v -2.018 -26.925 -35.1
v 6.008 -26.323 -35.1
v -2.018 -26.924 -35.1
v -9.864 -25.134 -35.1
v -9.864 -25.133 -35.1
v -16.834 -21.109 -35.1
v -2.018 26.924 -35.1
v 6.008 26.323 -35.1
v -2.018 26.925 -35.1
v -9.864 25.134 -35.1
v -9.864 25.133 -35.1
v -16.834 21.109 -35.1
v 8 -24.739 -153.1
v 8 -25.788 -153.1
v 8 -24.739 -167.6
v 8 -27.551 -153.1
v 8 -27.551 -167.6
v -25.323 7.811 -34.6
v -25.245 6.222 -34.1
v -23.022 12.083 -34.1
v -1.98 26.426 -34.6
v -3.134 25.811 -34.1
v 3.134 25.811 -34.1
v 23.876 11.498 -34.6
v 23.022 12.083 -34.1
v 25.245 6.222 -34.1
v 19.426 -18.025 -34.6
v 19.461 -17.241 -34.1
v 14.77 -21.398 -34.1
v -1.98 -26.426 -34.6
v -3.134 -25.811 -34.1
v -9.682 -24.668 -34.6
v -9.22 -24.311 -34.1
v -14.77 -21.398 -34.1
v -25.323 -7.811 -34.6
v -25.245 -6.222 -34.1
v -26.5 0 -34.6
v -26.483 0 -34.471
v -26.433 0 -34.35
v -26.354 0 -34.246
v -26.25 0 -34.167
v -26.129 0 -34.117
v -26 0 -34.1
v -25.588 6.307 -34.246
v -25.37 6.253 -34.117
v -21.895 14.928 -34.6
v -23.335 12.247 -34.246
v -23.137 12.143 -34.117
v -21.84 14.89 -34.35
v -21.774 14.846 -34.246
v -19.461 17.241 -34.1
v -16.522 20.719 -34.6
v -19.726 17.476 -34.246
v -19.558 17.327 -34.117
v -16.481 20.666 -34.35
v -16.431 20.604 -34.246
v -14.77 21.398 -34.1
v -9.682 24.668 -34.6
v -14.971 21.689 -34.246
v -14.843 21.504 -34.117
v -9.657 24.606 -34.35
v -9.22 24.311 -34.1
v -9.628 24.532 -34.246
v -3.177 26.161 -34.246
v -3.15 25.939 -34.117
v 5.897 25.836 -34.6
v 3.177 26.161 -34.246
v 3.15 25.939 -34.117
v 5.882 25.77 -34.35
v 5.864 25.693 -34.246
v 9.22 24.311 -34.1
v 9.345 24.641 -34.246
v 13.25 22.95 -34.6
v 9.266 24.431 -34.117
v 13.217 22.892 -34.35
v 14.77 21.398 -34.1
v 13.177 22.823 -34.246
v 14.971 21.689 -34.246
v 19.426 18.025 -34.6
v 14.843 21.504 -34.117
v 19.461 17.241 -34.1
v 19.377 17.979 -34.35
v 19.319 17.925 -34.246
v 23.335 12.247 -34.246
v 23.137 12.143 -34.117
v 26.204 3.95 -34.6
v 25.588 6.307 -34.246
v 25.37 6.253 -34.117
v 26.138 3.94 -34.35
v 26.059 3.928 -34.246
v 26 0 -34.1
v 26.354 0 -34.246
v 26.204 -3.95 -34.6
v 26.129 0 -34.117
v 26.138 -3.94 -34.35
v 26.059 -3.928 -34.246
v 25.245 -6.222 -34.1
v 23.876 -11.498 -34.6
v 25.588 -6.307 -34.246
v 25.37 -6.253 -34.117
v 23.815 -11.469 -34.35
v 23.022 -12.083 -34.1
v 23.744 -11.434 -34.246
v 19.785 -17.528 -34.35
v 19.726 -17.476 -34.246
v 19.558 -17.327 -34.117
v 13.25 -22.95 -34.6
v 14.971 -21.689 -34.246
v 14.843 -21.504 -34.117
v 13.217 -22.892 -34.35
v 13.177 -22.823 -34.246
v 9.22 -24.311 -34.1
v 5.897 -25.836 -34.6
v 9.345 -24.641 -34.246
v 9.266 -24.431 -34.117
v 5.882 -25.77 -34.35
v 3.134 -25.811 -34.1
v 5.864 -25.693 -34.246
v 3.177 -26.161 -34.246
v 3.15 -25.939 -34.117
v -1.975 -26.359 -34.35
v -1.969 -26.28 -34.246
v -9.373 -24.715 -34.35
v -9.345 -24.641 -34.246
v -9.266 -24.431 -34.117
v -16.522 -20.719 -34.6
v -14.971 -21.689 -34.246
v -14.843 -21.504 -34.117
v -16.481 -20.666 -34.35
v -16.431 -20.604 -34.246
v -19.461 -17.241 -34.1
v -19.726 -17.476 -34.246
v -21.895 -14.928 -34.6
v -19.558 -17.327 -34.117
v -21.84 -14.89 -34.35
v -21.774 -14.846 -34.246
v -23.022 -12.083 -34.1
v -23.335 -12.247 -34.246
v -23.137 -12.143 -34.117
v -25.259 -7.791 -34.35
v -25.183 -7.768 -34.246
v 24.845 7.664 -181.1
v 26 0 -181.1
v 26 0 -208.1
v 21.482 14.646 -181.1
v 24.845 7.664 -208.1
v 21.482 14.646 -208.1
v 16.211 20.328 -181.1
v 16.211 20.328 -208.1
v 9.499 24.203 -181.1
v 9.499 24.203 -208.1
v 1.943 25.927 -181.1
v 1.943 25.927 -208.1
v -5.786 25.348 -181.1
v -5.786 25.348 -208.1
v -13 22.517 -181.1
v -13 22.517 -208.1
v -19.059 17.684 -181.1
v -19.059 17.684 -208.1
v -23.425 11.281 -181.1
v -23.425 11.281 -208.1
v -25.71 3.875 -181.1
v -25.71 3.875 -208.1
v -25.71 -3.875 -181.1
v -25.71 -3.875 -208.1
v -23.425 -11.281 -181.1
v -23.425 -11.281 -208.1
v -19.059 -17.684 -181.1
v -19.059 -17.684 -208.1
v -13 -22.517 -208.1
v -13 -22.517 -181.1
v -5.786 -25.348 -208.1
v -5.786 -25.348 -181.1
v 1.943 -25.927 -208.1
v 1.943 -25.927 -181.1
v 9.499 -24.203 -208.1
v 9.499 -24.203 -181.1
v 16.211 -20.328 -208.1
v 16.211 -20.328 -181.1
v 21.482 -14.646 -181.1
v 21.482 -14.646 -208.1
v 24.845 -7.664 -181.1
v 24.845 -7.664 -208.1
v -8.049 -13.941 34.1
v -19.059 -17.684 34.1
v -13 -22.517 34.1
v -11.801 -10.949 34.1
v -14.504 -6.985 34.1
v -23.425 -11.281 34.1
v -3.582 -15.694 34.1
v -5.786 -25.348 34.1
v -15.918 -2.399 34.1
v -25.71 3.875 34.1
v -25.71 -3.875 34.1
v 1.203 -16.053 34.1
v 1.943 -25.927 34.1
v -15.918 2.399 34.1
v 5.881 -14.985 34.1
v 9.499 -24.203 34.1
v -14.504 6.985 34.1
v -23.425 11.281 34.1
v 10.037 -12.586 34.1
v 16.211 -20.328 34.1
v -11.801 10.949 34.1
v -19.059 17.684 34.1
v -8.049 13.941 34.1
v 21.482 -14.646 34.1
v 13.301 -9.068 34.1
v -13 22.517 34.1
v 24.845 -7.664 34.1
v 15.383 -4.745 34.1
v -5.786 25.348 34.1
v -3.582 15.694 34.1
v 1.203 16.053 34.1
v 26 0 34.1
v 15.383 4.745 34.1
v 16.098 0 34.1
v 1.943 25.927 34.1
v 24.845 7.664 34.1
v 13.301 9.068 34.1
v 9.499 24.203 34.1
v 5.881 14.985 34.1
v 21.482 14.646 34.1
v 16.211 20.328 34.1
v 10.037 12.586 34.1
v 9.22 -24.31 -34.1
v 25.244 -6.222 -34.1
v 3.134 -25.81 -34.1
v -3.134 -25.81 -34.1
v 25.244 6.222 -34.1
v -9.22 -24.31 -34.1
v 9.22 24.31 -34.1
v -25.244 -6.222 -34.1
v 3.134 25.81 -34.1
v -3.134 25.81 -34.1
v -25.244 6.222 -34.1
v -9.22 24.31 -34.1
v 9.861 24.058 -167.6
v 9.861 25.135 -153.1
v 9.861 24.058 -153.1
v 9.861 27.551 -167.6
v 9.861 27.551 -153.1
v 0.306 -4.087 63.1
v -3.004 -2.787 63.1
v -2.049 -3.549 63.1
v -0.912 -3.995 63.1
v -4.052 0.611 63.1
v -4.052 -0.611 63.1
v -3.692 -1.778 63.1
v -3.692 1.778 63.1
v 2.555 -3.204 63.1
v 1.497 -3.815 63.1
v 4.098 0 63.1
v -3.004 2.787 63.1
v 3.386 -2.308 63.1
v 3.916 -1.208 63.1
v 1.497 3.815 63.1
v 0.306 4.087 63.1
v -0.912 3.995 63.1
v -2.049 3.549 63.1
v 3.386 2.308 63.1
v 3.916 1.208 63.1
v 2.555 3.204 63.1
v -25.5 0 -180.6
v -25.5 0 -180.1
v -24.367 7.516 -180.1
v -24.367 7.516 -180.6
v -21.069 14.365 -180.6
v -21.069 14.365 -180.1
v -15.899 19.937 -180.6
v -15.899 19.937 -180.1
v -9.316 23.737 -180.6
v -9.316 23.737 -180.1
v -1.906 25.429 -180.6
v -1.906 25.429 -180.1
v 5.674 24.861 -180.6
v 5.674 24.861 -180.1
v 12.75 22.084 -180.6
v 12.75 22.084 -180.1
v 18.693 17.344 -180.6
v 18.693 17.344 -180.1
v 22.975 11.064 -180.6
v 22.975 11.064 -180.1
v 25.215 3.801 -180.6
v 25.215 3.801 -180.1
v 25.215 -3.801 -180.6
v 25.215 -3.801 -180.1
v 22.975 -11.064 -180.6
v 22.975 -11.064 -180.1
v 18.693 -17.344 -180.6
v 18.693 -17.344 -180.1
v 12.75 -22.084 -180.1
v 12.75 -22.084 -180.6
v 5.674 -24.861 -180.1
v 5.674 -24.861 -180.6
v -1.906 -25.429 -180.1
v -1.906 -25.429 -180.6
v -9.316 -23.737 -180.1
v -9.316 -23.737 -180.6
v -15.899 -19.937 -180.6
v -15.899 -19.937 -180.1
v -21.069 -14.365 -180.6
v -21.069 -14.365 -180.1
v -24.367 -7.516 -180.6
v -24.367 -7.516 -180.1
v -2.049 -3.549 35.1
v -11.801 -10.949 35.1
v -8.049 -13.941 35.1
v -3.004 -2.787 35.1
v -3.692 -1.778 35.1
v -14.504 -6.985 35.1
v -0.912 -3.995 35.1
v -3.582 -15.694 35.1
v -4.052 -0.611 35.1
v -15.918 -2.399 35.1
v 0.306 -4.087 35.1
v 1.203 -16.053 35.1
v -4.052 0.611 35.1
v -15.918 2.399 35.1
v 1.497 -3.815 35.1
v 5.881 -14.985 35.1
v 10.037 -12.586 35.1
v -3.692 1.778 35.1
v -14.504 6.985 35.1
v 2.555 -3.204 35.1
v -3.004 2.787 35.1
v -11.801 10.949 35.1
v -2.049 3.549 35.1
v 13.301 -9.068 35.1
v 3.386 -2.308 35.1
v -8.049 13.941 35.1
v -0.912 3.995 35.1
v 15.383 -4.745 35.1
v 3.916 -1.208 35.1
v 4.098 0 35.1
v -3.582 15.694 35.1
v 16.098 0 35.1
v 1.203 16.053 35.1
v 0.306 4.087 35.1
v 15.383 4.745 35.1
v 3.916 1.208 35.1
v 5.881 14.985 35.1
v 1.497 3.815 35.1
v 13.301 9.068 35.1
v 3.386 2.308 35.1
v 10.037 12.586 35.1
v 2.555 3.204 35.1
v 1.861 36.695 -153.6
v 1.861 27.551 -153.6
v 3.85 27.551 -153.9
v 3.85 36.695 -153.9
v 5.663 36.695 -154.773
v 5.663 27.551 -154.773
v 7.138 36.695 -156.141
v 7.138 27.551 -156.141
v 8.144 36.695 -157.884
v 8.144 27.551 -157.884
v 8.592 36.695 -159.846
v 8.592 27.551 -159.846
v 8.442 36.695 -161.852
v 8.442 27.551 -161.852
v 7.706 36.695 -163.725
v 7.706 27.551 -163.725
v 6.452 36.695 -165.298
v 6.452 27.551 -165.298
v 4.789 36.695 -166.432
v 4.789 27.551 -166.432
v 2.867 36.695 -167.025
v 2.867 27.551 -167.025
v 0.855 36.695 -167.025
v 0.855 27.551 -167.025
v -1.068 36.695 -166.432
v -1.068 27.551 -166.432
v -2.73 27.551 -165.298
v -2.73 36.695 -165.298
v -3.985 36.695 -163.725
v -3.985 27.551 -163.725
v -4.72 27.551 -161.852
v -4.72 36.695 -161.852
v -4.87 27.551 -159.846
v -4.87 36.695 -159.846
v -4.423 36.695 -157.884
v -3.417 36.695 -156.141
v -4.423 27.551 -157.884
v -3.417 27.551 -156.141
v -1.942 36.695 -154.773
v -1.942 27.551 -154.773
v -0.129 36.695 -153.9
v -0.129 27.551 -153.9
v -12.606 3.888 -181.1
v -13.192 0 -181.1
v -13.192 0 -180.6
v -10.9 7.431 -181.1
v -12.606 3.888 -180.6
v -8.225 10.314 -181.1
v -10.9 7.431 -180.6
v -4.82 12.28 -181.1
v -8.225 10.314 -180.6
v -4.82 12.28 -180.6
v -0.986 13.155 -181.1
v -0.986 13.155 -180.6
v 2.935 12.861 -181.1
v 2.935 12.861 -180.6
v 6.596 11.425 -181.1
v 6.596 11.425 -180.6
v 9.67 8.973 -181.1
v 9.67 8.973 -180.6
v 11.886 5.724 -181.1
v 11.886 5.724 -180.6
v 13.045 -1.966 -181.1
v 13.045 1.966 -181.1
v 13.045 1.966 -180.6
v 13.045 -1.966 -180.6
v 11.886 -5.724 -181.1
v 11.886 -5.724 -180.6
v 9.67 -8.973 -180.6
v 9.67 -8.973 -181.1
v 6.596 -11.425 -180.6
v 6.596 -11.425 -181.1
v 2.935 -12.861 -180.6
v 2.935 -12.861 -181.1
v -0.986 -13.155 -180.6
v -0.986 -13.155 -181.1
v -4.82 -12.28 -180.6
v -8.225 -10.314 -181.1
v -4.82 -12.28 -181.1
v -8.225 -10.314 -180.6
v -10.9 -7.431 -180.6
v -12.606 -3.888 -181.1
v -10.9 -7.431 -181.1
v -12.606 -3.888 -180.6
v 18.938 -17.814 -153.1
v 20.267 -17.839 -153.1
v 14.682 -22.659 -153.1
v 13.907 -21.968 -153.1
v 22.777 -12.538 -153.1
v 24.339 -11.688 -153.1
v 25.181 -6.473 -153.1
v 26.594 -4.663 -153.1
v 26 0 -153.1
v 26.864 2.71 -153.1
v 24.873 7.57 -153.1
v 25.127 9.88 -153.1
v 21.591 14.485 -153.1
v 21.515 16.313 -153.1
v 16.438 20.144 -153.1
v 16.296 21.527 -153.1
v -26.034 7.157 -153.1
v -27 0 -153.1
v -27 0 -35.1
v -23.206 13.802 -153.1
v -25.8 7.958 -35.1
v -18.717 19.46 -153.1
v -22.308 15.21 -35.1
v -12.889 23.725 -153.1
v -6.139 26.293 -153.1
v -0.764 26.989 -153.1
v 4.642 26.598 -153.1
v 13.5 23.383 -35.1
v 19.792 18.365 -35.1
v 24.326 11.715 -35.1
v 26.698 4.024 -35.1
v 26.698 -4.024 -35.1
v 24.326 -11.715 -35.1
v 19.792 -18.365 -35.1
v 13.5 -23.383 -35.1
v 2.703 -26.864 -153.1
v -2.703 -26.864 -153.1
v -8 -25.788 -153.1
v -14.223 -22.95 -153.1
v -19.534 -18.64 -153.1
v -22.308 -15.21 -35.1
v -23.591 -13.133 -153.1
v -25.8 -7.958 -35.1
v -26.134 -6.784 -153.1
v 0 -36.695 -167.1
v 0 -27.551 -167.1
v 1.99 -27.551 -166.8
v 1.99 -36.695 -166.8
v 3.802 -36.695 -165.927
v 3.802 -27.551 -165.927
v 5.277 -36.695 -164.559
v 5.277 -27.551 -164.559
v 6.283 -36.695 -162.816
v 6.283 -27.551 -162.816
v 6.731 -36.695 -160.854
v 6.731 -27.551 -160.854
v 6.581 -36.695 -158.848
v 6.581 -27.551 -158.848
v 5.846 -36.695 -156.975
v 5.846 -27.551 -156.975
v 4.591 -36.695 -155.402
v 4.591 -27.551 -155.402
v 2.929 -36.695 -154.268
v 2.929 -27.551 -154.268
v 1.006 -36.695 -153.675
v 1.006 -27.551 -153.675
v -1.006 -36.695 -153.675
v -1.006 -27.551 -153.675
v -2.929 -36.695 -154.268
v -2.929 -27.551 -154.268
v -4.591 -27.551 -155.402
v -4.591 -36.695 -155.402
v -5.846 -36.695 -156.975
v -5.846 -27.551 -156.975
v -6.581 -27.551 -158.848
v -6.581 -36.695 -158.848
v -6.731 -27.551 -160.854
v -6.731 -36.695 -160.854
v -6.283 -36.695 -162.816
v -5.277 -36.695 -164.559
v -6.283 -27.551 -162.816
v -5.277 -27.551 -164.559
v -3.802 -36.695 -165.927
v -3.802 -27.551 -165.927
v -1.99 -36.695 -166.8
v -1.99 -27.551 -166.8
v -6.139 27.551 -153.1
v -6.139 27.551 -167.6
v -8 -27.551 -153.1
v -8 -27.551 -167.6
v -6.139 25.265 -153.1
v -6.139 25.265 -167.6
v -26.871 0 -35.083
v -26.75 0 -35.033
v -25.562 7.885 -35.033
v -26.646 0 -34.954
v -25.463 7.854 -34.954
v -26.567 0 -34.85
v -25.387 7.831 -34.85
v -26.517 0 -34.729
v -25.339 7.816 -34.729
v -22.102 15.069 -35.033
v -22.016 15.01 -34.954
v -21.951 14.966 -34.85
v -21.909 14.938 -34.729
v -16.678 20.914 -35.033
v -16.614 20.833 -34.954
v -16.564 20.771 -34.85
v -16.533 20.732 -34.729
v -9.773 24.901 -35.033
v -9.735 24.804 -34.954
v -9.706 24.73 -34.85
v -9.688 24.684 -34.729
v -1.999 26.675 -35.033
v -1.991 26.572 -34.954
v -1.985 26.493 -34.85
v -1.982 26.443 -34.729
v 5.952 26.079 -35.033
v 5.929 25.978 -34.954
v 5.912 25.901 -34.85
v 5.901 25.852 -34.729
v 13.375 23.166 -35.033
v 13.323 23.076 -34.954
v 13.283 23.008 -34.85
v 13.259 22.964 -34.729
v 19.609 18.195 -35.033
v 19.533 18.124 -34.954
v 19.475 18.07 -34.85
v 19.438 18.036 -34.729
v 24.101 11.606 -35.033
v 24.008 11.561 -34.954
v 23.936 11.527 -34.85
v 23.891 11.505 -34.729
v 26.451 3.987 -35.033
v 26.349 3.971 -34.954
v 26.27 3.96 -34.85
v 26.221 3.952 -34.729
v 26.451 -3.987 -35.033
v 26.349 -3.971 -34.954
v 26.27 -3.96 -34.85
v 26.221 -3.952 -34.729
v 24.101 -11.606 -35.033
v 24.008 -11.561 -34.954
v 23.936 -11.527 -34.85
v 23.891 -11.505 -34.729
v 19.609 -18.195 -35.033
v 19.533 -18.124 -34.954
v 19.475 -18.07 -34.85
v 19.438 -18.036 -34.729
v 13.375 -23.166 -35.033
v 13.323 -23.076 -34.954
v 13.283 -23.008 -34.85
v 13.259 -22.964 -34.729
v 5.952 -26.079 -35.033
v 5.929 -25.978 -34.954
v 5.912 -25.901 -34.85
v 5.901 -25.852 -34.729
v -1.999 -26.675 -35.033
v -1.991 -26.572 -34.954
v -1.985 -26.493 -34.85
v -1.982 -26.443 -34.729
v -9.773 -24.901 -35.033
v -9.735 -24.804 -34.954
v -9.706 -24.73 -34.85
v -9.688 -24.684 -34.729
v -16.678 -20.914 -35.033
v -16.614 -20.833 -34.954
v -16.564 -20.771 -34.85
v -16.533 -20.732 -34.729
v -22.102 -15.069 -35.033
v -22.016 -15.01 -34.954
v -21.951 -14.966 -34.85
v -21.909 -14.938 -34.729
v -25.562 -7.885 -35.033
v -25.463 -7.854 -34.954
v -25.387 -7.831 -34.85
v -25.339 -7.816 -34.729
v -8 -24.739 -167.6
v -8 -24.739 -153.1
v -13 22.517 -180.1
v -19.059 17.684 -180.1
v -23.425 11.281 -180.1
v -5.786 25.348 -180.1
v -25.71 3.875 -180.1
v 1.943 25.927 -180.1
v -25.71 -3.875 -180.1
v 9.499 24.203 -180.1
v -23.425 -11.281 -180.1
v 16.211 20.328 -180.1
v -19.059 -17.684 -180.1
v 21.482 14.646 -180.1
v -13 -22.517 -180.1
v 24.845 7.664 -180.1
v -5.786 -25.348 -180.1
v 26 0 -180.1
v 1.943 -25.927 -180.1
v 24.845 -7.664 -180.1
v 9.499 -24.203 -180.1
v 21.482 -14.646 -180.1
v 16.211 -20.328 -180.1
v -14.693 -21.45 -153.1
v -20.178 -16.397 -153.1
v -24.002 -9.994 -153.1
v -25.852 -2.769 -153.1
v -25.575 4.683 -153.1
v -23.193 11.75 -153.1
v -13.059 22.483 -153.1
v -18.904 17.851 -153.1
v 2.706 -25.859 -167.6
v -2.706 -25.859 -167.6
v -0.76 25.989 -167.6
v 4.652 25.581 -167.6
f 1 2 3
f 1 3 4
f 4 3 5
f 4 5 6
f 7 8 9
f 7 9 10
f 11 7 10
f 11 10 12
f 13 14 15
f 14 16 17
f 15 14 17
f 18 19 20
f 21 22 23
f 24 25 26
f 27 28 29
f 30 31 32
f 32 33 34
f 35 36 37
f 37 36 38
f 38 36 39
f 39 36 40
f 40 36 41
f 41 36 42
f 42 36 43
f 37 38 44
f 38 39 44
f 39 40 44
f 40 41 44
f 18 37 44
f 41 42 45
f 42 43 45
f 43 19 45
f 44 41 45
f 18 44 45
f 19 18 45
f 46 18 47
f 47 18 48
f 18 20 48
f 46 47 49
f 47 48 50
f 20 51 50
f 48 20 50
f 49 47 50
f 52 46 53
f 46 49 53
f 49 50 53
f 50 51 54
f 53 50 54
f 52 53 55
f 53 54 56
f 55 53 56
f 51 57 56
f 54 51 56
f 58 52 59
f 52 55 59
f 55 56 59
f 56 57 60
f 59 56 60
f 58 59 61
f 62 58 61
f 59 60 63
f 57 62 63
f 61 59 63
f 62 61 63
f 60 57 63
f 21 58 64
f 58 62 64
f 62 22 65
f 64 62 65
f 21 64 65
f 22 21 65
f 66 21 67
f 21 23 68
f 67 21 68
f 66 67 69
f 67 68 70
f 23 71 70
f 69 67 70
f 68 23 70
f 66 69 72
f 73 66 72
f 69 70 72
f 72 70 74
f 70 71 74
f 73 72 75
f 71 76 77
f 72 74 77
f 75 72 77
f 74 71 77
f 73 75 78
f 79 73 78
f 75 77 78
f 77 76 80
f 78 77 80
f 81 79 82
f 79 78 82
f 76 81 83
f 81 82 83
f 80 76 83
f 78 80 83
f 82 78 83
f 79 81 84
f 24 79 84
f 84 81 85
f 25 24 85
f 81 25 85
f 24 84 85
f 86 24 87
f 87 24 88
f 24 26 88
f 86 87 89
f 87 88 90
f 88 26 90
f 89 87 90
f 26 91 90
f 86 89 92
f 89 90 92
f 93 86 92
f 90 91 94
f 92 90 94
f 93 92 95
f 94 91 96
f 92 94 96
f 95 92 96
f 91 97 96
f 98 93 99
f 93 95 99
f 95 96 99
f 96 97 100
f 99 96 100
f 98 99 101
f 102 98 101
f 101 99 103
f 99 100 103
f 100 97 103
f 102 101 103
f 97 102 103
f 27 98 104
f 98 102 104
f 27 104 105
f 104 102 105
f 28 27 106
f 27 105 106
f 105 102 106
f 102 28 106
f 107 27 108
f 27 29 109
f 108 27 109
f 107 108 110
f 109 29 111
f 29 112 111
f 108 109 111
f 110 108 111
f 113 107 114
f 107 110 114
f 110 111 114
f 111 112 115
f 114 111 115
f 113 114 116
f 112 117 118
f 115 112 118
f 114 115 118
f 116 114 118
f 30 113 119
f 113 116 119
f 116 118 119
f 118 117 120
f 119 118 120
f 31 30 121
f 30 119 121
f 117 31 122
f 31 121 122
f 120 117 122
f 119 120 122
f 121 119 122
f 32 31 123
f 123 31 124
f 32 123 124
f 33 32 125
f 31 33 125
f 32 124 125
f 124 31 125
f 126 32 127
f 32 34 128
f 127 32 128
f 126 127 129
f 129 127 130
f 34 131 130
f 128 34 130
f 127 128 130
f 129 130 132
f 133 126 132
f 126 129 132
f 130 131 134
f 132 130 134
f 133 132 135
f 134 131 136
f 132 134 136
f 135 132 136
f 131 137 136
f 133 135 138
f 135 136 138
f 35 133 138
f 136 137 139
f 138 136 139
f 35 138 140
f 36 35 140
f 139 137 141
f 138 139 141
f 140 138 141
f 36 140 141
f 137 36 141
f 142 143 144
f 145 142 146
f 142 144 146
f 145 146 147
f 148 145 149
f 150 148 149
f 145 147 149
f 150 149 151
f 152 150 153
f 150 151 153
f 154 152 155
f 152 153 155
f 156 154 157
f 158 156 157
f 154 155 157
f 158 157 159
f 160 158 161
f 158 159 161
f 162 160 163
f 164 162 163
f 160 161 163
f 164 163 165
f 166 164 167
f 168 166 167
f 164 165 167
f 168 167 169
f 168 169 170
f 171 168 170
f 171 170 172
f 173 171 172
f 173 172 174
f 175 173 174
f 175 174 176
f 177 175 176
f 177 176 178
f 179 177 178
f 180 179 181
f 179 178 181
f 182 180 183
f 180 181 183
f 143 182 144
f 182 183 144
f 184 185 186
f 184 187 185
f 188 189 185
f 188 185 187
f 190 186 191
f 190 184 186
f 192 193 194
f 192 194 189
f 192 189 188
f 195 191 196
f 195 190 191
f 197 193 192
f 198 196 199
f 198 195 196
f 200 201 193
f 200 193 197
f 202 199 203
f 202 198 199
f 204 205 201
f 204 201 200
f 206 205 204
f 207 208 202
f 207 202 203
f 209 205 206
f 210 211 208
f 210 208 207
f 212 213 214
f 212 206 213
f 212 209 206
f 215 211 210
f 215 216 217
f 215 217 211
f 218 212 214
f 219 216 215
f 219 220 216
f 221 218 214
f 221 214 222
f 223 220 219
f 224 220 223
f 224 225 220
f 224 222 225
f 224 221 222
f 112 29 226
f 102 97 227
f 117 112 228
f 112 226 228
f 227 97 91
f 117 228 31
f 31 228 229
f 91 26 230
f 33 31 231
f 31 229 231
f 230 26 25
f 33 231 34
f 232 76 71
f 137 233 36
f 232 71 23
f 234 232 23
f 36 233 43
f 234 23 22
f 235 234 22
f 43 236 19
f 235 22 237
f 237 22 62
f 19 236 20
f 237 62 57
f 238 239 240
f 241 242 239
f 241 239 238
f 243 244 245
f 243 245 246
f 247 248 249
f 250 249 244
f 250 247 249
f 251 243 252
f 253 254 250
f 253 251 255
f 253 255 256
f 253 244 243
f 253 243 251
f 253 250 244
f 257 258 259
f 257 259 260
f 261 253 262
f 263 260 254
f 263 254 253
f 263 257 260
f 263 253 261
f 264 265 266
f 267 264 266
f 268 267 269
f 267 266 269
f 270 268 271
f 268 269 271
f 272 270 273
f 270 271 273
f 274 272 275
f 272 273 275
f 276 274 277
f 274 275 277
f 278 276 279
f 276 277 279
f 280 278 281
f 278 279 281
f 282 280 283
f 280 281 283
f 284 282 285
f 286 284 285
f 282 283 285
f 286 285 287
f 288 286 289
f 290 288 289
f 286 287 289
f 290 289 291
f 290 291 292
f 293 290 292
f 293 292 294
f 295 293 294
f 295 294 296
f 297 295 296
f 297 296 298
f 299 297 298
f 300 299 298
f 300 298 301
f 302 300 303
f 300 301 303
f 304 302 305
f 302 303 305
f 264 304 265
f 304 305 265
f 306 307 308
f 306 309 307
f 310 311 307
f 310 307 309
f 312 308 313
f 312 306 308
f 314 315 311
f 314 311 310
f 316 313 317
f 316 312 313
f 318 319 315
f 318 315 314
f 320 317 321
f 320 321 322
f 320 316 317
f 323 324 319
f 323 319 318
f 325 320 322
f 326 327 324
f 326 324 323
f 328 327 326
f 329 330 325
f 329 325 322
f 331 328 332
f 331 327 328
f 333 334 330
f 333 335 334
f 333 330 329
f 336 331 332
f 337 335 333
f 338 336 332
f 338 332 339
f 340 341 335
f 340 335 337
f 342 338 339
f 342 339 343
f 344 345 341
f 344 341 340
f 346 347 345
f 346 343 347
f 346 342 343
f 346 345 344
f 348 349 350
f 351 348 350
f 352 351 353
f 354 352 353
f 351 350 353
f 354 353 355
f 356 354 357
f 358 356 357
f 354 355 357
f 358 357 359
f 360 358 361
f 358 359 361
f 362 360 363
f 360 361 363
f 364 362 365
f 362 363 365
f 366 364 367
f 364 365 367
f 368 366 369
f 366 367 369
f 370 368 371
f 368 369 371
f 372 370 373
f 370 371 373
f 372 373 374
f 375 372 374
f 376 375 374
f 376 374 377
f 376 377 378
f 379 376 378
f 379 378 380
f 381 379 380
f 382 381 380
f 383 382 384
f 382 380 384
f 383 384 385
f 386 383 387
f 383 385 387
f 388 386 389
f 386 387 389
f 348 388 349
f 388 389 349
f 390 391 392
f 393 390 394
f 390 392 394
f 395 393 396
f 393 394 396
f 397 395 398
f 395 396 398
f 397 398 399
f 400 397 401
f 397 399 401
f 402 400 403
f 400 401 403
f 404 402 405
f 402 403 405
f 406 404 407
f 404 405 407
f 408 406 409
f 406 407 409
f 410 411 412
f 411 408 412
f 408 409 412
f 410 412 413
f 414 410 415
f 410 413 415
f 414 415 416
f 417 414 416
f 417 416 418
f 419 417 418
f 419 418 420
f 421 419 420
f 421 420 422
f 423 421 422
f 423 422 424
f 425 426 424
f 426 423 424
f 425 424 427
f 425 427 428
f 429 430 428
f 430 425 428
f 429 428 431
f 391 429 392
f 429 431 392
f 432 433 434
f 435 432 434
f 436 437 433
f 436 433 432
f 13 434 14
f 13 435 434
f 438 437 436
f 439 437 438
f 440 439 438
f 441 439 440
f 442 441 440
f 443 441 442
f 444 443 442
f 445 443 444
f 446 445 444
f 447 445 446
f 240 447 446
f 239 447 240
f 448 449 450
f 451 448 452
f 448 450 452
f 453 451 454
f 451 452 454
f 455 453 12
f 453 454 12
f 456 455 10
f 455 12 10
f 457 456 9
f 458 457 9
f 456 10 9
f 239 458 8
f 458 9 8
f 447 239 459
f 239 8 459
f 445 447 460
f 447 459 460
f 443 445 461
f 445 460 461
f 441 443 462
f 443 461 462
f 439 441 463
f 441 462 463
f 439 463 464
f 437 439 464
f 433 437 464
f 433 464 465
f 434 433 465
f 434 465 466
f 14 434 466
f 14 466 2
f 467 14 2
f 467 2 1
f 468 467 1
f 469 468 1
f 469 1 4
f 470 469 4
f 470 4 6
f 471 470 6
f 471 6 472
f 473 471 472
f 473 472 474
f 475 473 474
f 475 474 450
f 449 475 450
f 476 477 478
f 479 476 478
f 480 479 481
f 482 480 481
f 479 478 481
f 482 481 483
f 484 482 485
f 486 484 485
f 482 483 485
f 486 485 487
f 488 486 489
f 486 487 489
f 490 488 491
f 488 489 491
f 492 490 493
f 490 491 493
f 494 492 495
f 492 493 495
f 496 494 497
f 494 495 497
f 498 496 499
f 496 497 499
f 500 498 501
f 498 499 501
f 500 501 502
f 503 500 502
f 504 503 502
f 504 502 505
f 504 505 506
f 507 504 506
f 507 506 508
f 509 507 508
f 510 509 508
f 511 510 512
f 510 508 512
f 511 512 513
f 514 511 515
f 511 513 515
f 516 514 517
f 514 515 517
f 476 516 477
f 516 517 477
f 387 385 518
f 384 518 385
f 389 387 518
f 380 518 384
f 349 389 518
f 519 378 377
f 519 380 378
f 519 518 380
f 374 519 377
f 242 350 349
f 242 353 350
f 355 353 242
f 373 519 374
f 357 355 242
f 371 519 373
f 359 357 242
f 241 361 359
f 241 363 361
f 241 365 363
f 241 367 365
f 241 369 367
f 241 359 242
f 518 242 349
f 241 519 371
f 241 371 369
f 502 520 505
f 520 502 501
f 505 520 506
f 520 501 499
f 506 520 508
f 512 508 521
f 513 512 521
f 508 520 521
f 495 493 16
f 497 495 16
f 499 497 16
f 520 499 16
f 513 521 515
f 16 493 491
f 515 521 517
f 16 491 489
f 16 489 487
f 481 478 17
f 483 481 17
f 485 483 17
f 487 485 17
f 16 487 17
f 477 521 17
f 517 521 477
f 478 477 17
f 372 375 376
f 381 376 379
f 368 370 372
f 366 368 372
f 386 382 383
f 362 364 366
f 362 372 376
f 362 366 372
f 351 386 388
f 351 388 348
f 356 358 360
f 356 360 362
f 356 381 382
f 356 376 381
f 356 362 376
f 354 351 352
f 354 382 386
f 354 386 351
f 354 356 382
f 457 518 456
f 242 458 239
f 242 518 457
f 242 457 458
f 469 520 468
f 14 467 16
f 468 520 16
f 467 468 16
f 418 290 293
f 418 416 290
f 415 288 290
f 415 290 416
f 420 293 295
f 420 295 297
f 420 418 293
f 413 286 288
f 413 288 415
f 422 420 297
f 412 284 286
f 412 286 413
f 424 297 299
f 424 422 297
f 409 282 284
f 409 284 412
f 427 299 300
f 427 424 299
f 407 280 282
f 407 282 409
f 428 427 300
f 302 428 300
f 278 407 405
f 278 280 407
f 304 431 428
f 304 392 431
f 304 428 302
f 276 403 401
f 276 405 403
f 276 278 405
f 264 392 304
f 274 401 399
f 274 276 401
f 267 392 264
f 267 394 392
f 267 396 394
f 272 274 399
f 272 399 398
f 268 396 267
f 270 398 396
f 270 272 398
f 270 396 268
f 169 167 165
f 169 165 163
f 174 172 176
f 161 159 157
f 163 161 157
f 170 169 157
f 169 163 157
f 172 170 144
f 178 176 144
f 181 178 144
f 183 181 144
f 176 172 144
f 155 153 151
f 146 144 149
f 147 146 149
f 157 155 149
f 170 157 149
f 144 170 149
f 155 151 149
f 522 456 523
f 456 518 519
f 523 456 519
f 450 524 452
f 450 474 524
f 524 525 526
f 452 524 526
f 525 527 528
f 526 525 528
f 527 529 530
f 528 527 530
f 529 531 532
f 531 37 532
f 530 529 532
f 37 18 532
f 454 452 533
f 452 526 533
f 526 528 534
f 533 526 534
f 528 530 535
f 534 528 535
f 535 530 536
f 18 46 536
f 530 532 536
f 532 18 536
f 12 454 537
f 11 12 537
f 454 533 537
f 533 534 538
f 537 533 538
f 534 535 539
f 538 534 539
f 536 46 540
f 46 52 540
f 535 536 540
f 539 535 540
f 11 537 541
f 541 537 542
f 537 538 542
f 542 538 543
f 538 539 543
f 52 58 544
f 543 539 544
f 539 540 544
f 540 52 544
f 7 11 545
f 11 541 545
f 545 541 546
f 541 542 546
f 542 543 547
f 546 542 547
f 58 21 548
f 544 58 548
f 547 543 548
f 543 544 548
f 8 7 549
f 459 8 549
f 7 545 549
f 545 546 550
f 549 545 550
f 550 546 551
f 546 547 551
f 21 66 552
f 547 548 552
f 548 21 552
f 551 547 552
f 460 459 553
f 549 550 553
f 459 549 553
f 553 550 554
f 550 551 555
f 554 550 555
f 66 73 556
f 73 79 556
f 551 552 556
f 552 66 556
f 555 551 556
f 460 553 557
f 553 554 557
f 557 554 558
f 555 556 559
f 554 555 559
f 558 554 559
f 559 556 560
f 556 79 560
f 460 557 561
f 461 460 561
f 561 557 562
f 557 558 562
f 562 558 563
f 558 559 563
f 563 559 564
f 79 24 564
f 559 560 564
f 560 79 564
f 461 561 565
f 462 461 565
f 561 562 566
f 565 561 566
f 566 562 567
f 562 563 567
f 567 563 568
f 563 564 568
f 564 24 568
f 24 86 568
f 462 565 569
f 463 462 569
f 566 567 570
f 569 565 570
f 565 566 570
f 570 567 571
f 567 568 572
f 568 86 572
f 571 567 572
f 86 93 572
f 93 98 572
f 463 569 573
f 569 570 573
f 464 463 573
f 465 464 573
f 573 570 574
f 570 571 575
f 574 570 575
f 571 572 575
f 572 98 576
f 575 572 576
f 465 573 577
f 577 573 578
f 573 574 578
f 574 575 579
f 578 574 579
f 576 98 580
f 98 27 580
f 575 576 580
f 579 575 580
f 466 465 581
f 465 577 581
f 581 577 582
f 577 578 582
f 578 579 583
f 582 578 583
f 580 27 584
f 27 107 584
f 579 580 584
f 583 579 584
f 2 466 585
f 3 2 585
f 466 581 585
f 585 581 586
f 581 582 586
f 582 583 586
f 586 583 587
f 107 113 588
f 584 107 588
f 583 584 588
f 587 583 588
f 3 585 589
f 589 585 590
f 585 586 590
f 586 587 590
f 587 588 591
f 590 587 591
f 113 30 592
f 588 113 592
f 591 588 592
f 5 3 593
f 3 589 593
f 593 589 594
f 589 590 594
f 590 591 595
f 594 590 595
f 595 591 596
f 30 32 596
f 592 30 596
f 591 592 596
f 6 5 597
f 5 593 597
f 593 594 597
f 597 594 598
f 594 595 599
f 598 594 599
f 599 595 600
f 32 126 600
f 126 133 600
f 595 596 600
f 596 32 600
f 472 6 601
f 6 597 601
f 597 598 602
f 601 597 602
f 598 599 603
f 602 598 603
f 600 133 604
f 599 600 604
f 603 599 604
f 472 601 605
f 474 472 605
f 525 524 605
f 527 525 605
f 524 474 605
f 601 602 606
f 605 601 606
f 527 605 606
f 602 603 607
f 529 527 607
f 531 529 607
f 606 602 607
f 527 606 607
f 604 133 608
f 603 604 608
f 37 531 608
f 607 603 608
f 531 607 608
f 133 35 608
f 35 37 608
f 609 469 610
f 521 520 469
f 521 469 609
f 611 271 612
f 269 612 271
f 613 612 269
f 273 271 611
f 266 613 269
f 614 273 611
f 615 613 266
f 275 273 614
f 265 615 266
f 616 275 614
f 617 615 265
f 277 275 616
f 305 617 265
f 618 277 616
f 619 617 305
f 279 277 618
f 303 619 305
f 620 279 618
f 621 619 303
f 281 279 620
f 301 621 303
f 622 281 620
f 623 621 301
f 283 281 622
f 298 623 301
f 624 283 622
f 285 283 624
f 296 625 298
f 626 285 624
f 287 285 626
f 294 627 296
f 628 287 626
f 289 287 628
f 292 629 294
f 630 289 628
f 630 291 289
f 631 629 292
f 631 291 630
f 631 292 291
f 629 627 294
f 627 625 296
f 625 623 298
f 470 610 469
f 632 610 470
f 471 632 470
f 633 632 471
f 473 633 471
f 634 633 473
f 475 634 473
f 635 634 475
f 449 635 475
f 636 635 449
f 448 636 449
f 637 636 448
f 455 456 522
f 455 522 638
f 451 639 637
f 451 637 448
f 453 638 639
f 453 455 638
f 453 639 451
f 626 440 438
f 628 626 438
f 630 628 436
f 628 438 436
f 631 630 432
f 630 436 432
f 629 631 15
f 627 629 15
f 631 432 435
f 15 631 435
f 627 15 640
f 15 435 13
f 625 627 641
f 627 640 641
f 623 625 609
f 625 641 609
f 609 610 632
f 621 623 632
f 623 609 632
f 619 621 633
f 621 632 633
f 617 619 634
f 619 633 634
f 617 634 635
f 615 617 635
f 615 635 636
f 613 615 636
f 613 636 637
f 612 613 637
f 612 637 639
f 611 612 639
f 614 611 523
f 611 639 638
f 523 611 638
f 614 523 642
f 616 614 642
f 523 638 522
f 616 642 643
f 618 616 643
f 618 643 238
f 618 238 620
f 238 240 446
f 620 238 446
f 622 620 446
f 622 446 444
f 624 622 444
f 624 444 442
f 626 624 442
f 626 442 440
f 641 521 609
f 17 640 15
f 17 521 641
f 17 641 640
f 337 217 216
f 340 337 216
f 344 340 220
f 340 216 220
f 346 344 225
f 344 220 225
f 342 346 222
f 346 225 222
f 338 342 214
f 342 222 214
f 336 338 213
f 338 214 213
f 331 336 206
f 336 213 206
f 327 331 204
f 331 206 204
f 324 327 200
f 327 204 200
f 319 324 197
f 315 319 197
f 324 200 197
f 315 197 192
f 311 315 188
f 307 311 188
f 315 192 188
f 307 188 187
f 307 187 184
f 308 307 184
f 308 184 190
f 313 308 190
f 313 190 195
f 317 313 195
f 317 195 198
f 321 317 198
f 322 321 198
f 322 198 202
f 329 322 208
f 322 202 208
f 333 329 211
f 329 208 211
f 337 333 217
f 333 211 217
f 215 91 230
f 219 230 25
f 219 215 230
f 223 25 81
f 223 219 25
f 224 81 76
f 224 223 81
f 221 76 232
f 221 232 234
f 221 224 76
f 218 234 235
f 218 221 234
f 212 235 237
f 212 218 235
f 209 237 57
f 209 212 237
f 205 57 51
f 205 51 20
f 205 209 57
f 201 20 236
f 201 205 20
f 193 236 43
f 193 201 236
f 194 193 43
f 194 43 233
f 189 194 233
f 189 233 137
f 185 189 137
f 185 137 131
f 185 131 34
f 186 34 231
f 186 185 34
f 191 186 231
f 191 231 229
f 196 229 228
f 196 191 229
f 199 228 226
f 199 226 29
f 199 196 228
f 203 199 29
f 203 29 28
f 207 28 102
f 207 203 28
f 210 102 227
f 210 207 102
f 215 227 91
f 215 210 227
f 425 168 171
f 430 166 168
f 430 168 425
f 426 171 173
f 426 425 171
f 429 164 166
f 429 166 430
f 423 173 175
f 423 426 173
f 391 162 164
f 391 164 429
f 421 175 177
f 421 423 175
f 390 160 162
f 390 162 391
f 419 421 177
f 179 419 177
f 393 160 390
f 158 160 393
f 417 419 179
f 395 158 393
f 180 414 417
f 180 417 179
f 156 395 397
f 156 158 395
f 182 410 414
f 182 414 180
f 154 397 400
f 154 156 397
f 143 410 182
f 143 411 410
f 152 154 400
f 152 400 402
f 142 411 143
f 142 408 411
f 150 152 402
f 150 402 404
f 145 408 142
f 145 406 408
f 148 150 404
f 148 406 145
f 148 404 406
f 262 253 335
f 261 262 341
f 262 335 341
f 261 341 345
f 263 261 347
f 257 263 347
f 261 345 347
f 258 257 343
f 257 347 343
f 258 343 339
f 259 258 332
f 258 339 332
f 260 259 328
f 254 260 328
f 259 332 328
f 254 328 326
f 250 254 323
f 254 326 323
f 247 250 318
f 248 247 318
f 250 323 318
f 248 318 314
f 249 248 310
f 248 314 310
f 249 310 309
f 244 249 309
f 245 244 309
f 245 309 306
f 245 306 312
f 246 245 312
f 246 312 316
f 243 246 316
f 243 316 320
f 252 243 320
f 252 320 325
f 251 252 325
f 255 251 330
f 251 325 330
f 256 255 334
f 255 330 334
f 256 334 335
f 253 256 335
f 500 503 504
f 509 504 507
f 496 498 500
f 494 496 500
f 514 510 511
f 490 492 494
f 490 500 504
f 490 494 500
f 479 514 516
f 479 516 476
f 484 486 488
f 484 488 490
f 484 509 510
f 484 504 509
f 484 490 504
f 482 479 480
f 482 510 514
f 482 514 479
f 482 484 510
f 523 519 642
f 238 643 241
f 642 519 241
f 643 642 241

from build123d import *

# Parameters (mm, degrees)
SKETCH1_R                 = 26
BOSS_EXTRUDE3_DEPTH       = 34.1
SKETCH4_R                 = 16.098
BOSS_EXTRUDE4_DEPTH       = 1
SKETCH5_R                 = 4.098
BOSS_EXTRUDE5_DEPTH       = 28
SKETCH7_R                 = 26.5
BOSS_EXTRUDE6_DEPTH       = 1
SKETCH8_R                 = 27
BOSS_EXTRUDE8_DEPTH       = 118
SKETCH12_R                = 26
BOSS_EXTRUDE9_DEPTH       = 27
SKETCH13_R                = 25.5
BOSS_EXTRUDE10_DEPTH      = 0.5
SKETCH16_R                = 13.192
BOSS_EXTRUDE12_DEPTH      = 2
SKETCH19_R                = 2.408
BOSS_EXTRUDE13_DEPTH      = 1
BOSS_EXTRUDE14_REACH      = 195.426
BOSS_EXTRUDE14_END_RADIUS = 26
SKETCH20_W                = 16
SKETCH20_H                = 14.5
FILLET2_R                 = 0.5
MIRROR2_START             = -208.1
MIRROR2_OUTLINE_R         = 26
MIRROR2_DEPTH             = 27
BOSS_EXTRUDE17_REACH      = 218.958
BOSS_EXTRUDE17_END_RADIUS = 26
SKETCH24_W                = 16
SKETCH24_H                = 14.5
SKETCH25_R                = 6.75
BOSS_EXTRUDE18_DEPTH      = 9.144
SKETCH26_R                = 6.75
BOSS_EXTRUDE19_DEPTH      = 9.144


# Read off the part's stored shape, not the designer's step: Mirror2
with BuildPart() as part:
    # Sketch1 → Boss-Extrude3 (new, symmetric)
    with BuildSketch(Plane.XY):
        Circle(SKETCH1_R)
    extrude(amount=BOSS_EXTRUDE3_DEPTH, both=True)

    # Sketch4 → Boss-Extrude4 (add)
    with BuildSketch(Plane.XY.offset(34.1)):
        Circle(SKETCH4_R)
    extrude(amount=BOSS_EXTRUDE4_DEPTH)

    # Sketch5 → Boss-Extrude5 (add)
    with BuildSketch(Plane.XY.offset(35.1)):
        Circle(SKETCH5_R)
    extrude(amount=BOSS_EXTRUDE5_DEPTH)

    # Sketch7 → Boss-Extrude6 (add)
    with BuildSketch(Plane(origin=(0, 0, -34.1), x_dir=(-1, 0, 0), z_dir=(0, 0, -1))):
        Circle(SKETCH7_R)
    extrude(amount=BOSS_EXTRUDE6_DEPTH)

    # Sketch8 → Boss-Extrude8 (add)
    with BuildSketch(Plane(origin=(0, 0, -35.1), x_dir=(-1, 0, 0), z_dir=(0, 0, -1))):
        Circle(SKETCH8_R)
    extrude(amount=BOSS_EXTRUDE8_DEPTH)

    # Sketch12 → Boss-Extrude9 (add)
    with BuildSketch(Plane(origin=(0, 0, -153.1), x_dir=(-1, 0, 0), z_dir=(0, 0, -1))):
        with Locations(Location((0, 0, 0), (0, 0, 180))):
            Circle(SKETCH12_R)
    extrude(amount=BOSS_EXTRUDE9_DEPTH)

    # Sketch13 → Boss-Extrude10 (add)
    with BuildSketch(Plane(origin=(0, 0, -180.1), x_dir=(-1, 0, 0), z_dir=(0, 0, -1))):
        Circle(SKETCH13_R)
    extrude(amount=BOSS_EXTRUDE10_DEPTH)

    # Sketch16 → Boss-Extrude12 (add)
    with BuildSketch(Plane(origin=(0, 0, -180.6), x_dir=(-1, 0, 0), z_dir=(0, 0, -1))):
        Circle(SKETCH16_R)
    extrude(amount=BOSS_EXTRUDE12_DEPTH)

    # Sketch19 → Boss-Extrude13 (add)
    with BuildSketch(Plane(origin=(0, 0, -182.6), x_dir=(-1, 0, 0), z_dir=(0, 0, -1))):
        Circle(SKETCH19_R)
    extrude(amount=BOSS_EXTRUDE13_DEPTH)

    # Boss-Extrude14: up to this cylinder (the profile starts outside it)
    boss_extrude14_end = Plane(origin=(0, 0, -160.35), z_dir=(0, 0, 1)) * Cylinder(BOSS_EXTRUDE14_END_RADIUS, 443.852, mode=Mode.PRIVATE)
    # Sketch20 → Boss-Extrude14 (add, up to the surface)
    with BuildSketch(Plane(origin=(0, 27.551, 0), x_dir=(1, 0, 0), z_dir=(0, 1, 0)), mode=Mode.PRIVATE) as boss_extrude14_sk1:
        with Locations((1.860761864, 160.35)):
            Rectangle(SKETCH20_W, SKETCH20_H)
    boss_extrude14_tool1 = extrude(boss_extrude14_sk1.sketch, amount=-BOSS_EXTRUDE14_REACH, mode=Mode.PRIVATE) - boss_extrude14_end
    add(boss_extrude14_tool1.solids().sort_by_distance((1.860762, 27.551, -160.35))[0])

    # Fillet2
    fillet2_edges = [part.edges().sort_by_distance(p)[0] for p in [
        (26.5, 0, -34.1),
        (26.5, 0, -35.1),
    ]]
    fillet(fillet2_edges, radius=FILLET2_R - 0.0001)  # a hair under: the kernel refuses the full size

    # Mirror2 outline → Mirror2 (add)
    with BuildSketch(Plane.XY.offset(MIRROR2_START)):
        Circle(MIRROR2_OUTLINE_R)
    extrude(amount=MIRROR2_DEPTH)

    # Boss-Extrude17: up to this cylinder (the profile starts outside it)
    boss_extrude17_end = Plane(origin=(0, 0, -160.35), z_dir=(0, 0, 1)) * Cylinder(BOSS_EXTRUDE17_END_RADIUS, 490.916, mode=Mode.PRIVATE)
    # Sketch24 → Boss-Extrude17 (add, up to the surface)
    with BuildSketch(Plane(origin=(0, -27.551, 0), x_dir=(1, 0, 0), z_dir=(0, 1, 0)), mode=Mode.PRIVATE) as boss_extrude17_sk1:
        with Locations((0, 160.35)):
            Rectangle(SKETCH24_W, SKETCH24_H)
    boss_extrude17_tool1 = extrude(boss_extrude17_sk1.sketch, amount=BOSS_EXTRUDE17_REACH, mode=Mode.PRIVATE) - boss_extrude17_end
    add(boss_extrude17_tool1.solids().sort_by_distance((0, -27.551, -160.35))[0])

    # Sketch25 → Boss-Extrude18 (add)
    with BuildSketch(Plane(origin=(0, -27.551, 0), x_dir=(-1, 0, 0), z_dir=(0, -1, 0))):
        with Locations(Location((0, 160.35, 0), (0, 0, 90))):
            Circle(SKETCH25_R)
    extrude(amount=BOSS_EXTRUDE18_DEPTH)

    # Sketch26 → Boss-Extrude19 (add)
    with BuildSketch(Plane(origin=(0, 27.551, 0), x_dir=(1, 0, 0), z_dir=(0, 1, 0))):
        with Locations(Location((1.860761864, 160.35, 0), (0, 0, 270))):
            Circle(SKETCH26_R)
    extrude(amount=BOSS_EXTRUDE19_DEPTH)


solid = part.part
